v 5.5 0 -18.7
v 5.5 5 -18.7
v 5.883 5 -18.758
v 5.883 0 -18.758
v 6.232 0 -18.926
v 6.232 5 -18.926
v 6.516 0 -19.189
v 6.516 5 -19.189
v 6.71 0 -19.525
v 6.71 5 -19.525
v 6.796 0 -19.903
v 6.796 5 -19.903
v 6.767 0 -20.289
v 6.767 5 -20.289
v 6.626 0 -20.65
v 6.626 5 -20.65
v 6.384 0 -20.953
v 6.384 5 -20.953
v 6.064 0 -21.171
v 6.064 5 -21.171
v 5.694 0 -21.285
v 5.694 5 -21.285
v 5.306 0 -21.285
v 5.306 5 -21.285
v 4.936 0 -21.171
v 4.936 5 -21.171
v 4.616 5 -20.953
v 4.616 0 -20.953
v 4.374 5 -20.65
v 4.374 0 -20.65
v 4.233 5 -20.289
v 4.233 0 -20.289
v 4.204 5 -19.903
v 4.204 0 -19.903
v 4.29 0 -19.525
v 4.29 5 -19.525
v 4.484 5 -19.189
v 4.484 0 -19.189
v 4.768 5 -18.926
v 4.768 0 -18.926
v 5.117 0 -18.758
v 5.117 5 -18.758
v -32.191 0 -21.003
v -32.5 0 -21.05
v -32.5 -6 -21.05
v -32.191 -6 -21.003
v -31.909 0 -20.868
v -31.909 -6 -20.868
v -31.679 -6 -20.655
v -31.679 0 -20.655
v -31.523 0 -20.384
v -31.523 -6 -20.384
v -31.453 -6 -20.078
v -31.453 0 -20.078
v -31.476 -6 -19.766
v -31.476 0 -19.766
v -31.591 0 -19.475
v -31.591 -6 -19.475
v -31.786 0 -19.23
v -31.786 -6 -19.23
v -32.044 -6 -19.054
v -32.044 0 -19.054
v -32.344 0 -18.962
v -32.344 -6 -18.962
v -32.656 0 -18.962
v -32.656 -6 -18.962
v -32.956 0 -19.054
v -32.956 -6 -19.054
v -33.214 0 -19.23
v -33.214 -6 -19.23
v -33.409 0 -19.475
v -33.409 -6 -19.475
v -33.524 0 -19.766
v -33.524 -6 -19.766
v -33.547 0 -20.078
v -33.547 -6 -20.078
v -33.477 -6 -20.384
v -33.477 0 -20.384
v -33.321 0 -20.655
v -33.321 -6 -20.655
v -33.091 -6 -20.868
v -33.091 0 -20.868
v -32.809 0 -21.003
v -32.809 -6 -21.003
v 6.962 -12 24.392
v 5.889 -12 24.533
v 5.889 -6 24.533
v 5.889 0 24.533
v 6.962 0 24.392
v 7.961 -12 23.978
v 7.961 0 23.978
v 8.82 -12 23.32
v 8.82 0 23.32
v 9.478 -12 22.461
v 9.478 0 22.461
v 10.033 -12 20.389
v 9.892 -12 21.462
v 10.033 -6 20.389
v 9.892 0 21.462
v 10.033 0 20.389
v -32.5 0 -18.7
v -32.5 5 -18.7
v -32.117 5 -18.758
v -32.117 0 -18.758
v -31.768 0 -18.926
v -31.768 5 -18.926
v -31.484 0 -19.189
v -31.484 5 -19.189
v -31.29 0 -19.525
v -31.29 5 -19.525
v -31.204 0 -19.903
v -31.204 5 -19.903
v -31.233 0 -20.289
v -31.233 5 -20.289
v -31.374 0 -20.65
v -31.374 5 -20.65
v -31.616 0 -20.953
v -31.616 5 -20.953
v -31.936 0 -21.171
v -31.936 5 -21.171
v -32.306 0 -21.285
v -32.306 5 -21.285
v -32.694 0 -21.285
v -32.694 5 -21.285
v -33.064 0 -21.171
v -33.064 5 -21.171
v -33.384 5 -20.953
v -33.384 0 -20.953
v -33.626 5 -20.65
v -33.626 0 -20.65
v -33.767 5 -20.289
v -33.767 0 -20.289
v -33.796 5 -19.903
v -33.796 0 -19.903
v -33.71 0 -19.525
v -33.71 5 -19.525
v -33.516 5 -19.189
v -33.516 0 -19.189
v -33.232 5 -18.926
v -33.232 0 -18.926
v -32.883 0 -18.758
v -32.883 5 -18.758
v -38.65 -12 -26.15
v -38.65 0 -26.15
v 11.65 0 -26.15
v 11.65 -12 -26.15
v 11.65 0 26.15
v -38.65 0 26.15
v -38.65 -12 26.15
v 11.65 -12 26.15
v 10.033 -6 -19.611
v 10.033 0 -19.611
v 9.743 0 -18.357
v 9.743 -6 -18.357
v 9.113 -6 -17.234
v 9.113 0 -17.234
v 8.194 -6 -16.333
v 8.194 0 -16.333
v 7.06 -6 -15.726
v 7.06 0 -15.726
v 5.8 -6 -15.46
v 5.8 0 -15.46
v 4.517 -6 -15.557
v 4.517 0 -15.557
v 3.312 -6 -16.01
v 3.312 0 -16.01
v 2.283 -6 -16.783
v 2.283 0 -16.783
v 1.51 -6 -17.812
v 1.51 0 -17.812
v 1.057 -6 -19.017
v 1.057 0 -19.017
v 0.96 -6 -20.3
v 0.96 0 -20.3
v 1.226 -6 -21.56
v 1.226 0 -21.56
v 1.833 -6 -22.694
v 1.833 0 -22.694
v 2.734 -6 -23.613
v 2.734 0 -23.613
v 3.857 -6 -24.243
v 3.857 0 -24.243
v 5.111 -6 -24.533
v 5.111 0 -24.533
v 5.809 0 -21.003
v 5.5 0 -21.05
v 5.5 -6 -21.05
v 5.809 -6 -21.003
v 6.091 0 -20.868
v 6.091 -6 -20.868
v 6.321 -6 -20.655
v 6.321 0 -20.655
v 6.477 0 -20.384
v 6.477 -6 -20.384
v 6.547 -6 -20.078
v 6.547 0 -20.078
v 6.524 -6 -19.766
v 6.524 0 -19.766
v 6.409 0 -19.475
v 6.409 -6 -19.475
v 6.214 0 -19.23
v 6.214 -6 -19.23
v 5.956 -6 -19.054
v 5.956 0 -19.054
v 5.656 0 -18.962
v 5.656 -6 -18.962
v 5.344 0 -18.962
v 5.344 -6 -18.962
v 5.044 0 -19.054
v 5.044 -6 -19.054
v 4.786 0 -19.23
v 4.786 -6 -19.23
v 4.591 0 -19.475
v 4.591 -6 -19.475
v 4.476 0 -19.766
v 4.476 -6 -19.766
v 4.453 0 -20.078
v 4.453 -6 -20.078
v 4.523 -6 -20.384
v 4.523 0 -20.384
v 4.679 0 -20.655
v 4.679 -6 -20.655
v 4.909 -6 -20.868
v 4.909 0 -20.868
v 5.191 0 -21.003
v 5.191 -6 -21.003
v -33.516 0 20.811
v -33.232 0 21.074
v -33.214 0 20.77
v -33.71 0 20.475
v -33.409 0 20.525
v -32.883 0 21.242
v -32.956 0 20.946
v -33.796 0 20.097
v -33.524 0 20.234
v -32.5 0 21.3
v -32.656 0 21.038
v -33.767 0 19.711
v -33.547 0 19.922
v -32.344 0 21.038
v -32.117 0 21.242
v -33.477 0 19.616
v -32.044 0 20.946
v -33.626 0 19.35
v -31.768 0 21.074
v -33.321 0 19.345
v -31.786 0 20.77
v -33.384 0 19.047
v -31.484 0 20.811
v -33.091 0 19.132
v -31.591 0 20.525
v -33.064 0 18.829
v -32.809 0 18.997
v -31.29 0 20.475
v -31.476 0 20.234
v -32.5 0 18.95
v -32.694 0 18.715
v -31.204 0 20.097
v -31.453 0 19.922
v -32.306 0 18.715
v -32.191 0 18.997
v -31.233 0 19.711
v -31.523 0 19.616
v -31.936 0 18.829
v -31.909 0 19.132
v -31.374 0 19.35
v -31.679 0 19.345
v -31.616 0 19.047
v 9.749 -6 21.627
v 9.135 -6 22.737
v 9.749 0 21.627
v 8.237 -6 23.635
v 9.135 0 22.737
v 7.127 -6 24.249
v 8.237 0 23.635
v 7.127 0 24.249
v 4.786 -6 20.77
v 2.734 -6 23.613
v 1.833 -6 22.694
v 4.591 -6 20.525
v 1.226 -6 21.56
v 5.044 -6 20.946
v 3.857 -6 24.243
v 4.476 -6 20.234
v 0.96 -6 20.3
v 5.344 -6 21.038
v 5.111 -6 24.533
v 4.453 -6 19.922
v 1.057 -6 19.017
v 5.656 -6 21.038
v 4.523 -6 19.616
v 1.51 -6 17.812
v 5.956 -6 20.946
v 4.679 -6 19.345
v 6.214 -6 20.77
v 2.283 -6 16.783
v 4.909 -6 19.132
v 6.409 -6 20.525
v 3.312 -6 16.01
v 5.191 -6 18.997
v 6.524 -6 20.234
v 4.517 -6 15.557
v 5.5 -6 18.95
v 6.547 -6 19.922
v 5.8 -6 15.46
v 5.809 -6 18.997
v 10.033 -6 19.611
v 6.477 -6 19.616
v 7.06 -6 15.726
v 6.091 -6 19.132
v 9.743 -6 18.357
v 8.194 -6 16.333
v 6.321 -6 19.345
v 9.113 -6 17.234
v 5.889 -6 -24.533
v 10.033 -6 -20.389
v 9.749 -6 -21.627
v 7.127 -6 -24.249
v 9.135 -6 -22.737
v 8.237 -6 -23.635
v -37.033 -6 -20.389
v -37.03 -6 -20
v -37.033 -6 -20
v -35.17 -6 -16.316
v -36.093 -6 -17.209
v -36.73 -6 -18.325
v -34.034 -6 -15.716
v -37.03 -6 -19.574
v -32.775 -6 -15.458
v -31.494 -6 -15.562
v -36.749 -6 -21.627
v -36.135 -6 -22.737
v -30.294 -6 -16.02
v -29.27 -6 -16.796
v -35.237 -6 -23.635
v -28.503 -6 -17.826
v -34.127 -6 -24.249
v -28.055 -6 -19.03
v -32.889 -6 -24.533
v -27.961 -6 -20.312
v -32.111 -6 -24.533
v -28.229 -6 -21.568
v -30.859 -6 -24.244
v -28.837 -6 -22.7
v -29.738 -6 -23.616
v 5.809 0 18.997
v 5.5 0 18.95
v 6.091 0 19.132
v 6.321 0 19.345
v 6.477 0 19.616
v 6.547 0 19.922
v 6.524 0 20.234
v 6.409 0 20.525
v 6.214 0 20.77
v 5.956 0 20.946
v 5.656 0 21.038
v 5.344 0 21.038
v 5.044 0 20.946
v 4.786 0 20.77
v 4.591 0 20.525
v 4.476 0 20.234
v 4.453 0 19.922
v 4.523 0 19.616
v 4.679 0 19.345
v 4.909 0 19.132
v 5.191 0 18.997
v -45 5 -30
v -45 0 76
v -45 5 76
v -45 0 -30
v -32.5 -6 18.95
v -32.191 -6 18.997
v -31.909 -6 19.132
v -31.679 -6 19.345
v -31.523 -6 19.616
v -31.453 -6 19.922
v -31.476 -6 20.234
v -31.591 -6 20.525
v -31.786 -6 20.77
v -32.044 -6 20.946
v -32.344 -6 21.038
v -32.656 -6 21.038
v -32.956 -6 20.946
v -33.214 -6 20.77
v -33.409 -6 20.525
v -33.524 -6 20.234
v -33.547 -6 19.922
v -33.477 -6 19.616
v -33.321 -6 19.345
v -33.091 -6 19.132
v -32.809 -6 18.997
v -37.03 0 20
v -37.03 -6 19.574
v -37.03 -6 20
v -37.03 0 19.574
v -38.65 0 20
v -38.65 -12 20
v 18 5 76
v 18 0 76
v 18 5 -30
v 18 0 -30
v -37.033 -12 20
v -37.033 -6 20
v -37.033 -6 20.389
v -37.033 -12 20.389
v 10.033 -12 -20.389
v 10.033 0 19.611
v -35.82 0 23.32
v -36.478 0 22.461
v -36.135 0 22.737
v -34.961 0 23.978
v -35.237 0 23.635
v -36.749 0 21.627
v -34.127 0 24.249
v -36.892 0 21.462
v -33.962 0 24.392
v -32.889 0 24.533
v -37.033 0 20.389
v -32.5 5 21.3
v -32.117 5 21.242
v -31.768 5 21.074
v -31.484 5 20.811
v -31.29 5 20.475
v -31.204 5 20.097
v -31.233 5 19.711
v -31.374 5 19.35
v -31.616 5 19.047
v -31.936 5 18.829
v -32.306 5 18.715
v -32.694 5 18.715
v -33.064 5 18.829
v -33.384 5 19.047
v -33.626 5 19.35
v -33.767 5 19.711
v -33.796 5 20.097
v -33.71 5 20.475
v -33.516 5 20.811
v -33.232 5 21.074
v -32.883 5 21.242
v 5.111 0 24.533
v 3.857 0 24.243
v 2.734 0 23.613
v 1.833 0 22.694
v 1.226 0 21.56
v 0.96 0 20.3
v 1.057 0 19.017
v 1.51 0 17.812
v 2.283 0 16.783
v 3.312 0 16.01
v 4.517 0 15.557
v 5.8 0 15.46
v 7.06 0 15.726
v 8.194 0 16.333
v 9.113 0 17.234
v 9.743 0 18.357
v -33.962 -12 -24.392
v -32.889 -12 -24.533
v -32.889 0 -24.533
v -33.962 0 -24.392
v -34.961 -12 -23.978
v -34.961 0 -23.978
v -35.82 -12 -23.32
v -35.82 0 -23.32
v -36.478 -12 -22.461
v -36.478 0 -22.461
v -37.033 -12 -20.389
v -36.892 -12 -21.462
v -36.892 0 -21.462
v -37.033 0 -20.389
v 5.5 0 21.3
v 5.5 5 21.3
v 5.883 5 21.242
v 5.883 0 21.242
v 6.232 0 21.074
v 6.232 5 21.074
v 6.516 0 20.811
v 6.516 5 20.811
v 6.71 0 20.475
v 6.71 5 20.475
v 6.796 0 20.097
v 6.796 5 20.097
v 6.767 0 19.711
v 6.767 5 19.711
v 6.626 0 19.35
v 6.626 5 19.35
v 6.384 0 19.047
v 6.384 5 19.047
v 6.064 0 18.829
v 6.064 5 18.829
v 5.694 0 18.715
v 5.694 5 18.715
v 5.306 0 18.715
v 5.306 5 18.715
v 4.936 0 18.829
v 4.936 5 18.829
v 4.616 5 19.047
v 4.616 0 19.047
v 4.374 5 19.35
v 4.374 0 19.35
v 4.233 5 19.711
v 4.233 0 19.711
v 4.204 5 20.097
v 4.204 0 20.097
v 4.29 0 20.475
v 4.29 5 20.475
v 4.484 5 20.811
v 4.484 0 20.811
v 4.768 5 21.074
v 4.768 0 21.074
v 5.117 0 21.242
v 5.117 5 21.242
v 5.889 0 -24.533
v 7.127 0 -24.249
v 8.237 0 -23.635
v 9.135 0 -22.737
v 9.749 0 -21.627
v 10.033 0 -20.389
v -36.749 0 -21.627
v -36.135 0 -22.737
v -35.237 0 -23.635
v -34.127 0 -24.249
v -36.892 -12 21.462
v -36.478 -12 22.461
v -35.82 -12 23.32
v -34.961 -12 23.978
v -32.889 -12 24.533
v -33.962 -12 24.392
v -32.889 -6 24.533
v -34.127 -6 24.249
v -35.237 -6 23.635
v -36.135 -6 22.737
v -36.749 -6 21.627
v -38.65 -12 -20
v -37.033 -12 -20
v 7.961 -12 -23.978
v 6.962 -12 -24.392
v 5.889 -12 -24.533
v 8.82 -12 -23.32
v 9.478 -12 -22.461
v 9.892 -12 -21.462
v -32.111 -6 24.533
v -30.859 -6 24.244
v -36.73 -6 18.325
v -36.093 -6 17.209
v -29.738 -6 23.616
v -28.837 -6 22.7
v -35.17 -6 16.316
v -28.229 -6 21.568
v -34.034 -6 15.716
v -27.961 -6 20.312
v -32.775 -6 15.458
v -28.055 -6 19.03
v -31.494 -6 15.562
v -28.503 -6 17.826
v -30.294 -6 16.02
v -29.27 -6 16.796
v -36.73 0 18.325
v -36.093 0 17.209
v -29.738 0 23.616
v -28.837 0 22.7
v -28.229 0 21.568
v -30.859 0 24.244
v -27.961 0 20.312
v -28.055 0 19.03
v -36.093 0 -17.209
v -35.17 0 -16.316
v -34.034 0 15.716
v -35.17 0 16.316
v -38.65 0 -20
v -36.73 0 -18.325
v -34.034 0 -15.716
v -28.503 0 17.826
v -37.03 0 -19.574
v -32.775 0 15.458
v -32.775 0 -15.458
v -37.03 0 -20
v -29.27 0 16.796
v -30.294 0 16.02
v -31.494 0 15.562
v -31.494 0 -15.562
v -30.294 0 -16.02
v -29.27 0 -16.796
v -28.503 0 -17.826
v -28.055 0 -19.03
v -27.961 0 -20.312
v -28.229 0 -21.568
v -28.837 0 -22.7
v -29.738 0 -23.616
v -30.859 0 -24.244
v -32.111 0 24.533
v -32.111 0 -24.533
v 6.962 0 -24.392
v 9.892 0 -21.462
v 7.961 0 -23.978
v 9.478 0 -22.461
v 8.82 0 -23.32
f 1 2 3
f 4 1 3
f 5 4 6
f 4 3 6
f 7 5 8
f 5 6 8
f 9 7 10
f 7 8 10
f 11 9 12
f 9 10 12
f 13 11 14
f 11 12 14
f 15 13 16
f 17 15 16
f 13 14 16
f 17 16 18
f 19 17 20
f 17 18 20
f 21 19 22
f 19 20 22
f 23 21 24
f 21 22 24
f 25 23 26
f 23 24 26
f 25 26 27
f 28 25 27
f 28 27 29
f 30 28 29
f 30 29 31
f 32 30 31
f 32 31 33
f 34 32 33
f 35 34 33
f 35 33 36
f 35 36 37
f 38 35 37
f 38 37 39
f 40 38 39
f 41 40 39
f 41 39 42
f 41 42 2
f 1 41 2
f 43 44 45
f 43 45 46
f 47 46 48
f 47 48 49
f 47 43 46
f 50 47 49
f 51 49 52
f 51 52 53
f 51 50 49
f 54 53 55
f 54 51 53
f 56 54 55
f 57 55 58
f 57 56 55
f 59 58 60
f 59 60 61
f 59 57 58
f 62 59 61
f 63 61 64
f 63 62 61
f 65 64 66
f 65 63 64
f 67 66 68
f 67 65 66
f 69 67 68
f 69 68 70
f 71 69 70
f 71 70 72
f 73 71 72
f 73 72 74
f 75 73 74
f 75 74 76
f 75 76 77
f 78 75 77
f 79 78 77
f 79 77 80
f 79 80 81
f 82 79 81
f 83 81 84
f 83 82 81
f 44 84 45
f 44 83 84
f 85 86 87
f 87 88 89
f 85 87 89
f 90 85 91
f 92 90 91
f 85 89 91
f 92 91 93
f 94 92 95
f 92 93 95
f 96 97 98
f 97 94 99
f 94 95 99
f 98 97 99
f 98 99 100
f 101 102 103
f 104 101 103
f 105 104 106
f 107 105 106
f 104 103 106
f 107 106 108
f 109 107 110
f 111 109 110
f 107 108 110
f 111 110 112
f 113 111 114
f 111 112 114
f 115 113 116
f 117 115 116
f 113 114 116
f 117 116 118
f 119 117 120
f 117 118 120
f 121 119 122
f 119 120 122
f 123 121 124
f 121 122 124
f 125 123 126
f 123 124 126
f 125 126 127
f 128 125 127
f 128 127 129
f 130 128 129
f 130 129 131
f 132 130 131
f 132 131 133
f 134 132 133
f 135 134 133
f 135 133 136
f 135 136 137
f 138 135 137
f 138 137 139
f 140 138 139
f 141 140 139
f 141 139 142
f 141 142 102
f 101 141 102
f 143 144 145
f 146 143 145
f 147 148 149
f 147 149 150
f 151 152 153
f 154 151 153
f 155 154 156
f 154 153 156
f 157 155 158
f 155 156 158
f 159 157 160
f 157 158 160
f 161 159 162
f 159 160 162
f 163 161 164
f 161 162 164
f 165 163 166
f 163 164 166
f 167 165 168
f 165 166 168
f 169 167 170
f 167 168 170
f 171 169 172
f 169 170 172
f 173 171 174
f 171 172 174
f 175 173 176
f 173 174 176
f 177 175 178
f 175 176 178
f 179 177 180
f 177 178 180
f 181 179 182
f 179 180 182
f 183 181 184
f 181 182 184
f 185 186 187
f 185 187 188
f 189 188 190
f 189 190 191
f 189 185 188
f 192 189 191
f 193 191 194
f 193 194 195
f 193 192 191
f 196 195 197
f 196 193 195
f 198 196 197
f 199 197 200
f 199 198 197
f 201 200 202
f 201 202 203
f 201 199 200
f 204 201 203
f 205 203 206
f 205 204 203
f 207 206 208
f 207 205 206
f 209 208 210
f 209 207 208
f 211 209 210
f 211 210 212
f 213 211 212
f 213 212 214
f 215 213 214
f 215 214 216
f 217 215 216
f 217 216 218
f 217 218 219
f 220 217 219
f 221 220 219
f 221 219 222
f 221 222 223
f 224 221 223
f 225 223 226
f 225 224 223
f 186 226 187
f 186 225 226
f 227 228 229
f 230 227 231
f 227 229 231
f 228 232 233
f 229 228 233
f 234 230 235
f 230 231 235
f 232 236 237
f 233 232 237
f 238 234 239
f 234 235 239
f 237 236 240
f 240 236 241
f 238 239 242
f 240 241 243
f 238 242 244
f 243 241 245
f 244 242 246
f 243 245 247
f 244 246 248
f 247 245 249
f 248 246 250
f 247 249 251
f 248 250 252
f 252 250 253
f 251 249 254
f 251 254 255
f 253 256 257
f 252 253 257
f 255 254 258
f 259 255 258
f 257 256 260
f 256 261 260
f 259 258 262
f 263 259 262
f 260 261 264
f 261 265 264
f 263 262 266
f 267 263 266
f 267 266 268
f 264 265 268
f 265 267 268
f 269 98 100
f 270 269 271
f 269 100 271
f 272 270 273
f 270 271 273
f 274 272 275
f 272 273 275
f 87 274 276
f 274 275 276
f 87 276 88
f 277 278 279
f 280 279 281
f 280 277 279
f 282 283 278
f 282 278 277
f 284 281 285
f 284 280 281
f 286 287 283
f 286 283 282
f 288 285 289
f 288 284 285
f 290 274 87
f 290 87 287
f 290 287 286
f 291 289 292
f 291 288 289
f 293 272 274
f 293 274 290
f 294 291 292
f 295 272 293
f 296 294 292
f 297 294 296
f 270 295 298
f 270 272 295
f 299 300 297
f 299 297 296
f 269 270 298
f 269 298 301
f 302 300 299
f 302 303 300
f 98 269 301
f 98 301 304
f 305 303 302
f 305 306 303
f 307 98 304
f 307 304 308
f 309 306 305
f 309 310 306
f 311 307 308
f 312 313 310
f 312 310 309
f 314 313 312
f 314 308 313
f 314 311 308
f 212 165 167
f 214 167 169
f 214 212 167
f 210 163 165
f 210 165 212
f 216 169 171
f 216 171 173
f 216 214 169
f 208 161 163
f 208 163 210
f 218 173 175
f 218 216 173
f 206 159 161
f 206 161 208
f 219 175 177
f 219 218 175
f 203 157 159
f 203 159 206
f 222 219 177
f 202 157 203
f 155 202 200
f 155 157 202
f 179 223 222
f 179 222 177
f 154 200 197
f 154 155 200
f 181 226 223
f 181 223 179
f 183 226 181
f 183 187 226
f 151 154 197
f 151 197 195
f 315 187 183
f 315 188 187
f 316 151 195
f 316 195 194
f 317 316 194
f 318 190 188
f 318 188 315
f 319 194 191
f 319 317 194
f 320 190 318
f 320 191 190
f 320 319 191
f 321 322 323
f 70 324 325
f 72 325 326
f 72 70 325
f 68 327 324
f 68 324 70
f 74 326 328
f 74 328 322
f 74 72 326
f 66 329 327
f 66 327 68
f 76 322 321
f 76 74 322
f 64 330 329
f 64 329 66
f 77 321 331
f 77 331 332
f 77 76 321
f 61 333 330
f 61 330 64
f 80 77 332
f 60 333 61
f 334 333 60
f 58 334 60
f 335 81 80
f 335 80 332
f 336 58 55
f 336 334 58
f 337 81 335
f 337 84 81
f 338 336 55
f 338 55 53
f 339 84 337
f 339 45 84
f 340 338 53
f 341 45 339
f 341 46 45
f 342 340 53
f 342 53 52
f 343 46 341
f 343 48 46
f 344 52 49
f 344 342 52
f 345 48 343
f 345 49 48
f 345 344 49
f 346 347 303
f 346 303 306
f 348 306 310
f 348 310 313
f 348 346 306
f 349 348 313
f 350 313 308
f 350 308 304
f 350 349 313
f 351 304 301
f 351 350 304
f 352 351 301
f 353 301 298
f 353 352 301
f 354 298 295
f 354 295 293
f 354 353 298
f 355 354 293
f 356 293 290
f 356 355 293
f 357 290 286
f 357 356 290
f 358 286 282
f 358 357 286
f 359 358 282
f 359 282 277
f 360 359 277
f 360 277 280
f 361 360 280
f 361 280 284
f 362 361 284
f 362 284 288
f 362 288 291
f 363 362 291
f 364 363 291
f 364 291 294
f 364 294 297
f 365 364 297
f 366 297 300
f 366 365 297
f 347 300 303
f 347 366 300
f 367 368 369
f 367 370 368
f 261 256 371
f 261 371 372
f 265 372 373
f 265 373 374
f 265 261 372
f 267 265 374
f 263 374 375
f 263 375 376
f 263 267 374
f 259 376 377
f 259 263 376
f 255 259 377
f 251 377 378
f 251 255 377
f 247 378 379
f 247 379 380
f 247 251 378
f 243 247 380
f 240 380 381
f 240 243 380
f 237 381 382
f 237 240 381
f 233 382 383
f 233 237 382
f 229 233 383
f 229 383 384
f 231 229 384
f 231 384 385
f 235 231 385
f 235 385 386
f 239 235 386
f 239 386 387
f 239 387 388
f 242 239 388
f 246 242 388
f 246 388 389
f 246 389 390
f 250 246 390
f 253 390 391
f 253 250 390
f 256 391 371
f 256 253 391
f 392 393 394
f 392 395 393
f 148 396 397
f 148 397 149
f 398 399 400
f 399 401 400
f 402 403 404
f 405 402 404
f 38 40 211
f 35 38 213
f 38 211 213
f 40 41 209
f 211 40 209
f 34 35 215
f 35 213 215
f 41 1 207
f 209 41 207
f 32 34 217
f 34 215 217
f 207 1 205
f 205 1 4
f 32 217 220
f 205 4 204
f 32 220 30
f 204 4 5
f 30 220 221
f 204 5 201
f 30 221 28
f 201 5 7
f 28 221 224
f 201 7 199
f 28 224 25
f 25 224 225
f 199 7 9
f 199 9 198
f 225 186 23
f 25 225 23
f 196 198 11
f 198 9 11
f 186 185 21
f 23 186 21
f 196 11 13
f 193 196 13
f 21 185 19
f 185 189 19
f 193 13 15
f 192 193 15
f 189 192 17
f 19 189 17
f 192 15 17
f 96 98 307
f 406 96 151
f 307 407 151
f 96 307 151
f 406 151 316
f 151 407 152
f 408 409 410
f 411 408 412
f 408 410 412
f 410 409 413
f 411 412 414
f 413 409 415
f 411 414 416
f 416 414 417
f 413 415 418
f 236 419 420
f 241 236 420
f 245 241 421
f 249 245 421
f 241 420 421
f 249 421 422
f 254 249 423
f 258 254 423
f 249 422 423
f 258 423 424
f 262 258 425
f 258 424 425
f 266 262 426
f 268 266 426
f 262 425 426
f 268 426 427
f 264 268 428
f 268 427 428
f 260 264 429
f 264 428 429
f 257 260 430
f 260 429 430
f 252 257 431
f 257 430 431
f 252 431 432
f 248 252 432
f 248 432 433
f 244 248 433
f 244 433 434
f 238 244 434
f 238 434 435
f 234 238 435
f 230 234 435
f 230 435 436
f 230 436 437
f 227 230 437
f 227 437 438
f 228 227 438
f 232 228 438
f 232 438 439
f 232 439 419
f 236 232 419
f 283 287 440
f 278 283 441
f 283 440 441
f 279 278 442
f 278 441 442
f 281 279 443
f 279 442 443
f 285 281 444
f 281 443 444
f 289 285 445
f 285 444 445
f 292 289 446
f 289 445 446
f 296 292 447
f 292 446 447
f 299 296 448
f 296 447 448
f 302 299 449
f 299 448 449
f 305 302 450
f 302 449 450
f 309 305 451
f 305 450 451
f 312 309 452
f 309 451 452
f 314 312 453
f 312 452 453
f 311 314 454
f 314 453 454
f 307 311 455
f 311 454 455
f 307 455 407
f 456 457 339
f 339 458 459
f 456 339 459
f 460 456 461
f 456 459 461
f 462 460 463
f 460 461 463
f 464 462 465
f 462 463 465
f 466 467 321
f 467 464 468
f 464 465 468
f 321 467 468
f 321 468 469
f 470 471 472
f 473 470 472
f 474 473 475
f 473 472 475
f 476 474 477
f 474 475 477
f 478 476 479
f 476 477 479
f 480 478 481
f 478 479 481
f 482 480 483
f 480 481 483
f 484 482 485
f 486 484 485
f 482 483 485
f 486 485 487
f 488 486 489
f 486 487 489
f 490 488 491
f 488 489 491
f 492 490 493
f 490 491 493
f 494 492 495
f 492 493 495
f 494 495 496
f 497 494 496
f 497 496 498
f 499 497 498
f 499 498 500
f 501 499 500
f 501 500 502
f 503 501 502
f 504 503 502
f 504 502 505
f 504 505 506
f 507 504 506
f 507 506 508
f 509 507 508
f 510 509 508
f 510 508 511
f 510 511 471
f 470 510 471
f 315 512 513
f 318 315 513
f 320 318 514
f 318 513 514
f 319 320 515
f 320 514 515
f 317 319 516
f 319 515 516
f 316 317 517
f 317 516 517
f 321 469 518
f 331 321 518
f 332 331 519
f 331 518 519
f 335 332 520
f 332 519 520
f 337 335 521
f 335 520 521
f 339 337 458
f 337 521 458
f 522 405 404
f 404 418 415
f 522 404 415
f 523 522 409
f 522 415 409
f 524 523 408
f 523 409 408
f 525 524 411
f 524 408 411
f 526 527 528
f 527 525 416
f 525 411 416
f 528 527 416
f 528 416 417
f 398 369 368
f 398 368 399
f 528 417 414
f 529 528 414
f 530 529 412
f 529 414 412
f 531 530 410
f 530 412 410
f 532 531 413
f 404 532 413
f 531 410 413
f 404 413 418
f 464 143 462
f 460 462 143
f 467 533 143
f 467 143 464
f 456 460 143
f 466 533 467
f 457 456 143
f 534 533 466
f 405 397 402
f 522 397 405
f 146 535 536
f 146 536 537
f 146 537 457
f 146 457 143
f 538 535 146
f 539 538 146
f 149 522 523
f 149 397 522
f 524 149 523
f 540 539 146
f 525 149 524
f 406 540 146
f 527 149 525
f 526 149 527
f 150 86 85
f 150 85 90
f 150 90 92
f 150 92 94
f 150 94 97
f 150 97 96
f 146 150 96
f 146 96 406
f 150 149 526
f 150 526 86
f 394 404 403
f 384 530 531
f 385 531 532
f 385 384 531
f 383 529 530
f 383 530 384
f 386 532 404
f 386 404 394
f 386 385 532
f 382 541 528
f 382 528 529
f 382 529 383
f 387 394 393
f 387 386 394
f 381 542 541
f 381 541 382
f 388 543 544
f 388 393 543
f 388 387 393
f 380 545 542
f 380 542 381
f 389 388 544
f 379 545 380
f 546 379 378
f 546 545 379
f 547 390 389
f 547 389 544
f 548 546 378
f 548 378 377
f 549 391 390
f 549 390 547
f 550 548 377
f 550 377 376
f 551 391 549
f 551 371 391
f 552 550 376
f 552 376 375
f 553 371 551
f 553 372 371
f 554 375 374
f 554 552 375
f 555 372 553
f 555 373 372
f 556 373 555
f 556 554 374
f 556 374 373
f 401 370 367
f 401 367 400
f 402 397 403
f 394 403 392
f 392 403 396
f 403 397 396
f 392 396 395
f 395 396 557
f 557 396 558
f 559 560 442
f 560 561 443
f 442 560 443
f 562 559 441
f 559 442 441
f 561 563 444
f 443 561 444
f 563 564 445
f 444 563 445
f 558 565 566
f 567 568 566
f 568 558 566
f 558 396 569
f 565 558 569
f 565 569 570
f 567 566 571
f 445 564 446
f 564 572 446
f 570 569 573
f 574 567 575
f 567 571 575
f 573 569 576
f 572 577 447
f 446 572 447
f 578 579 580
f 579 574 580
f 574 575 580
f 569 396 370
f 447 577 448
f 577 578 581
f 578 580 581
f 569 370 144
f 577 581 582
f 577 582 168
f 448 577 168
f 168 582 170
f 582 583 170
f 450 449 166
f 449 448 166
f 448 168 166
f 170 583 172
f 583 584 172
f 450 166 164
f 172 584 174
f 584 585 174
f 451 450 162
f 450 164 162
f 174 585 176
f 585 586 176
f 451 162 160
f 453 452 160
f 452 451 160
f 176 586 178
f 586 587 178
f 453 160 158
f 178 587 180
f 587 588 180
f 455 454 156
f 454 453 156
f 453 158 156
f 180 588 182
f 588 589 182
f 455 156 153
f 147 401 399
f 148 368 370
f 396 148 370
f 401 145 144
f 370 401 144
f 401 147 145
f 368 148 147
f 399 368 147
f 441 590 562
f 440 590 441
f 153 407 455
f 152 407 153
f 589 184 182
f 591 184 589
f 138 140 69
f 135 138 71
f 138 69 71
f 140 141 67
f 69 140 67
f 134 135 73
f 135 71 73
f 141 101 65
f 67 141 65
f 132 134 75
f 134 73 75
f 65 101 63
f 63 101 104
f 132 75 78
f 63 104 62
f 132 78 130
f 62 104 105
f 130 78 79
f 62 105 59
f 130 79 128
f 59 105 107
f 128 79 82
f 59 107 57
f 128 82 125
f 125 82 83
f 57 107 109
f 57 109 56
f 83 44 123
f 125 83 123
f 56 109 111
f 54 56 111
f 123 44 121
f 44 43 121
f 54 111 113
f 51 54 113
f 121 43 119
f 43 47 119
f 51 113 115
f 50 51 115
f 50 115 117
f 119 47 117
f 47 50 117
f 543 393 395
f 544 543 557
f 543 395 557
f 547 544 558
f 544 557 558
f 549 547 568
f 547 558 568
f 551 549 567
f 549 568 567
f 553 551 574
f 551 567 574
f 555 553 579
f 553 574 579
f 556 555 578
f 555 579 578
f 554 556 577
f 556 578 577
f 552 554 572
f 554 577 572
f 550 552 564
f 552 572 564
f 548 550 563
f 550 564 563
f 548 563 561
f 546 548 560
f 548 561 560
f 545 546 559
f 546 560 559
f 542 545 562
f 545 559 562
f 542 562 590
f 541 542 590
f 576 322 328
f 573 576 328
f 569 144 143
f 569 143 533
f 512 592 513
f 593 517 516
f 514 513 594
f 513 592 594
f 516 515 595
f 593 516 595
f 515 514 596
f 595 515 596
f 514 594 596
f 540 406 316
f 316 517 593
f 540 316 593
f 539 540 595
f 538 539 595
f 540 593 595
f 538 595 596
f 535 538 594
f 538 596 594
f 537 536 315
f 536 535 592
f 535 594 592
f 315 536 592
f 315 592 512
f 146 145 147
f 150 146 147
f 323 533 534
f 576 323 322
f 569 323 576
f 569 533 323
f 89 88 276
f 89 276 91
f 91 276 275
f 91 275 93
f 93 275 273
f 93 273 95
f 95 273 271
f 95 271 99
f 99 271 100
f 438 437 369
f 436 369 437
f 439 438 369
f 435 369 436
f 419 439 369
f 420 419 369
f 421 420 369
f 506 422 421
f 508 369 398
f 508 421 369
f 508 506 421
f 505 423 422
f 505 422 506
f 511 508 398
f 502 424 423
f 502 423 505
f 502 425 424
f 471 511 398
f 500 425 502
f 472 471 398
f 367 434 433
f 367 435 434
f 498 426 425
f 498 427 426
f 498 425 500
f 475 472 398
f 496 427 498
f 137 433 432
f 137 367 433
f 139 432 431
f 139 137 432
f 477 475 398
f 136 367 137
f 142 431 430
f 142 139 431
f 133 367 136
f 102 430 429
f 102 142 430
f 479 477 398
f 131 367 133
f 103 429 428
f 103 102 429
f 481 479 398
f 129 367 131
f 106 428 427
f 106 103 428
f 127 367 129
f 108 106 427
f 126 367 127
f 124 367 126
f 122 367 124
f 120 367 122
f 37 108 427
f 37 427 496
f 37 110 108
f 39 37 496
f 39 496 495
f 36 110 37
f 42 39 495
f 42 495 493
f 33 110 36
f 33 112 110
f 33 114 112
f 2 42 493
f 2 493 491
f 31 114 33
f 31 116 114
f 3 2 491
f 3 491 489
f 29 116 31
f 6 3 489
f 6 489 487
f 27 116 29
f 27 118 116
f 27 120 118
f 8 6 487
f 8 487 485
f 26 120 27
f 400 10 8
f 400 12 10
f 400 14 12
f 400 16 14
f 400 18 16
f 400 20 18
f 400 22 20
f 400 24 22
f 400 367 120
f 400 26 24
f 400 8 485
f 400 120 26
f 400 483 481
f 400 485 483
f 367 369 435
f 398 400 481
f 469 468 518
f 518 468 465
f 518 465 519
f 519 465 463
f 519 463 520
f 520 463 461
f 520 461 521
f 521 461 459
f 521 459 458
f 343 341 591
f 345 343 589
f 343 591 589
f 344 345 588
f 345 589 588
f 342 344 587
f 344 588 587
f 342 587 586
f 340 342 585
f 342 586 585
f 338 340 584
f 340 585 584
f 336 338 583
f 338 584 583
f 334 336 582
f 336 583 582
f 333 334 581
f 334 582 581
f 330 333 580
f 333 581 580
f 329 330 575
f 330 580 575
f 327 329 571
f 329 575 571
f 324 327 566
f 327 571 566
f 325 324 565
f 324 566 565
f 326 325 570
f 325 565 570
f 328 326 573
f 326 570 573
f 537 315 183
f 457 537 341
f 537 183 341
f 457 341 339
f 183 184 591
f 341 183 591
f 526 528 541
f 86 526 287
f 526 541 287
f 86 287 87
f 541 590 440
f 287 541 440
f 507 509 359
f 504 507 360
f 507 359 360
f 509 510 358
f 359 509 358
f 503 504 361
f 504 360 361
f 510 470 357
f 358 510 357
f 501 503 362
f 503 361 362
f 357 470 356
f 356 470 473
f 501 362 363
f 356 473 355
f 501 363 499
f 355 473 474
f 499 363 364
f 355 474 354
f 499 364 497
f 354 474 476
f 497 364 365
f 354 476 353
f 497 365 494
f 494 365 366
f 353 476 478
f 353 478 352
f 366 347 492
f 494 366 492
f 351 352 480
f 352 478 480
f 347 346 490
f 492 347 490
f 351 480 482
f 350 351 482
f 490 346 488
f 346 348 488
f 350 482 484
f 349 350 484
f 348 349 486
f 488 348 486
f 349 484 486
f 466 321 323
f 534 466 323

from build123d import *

# Parameters (mm, degrees)
SKETCH3_W           = 63
SKETCH3_H           = 60
BOSS_EXTRUDE3_DEPTH = 5
CUT_EXTRUDE1_REACH  = 56.314
SKETCH4_R           = 1.3
SKETCH9_R           = 4.55
SKETCH9_R_2         = 1.05
BOSS_EXTRUDE5_DEPTH = 6
SKETCH11_W          = 63
SKETCH11_H          = 5
BOSS_EXTRUDE7_DEPTH = 46
SKETCH12_W          = 50.3
SKETCH12_H          = 52.3
BOSS_EXTRUDE8_DEPTH = 12
SKETCH13_W          = 40
SKETCH13_H          = 12
CUT_EXTRUDE4_DEPTH  = 1.62


with BuildPart() as part:
    # Sketch3 → Boss-Extrude3 (new body)
    with BuildSketch(Plane(origin=(0, 0, 0), x_dir=(1, 0, 0), z_dir=(0, 1, 0))):
        with Locations((-13.5, 0)):
            Rectangle(SKETCH3_W, SKETCH3_H)
    extrude(amount=BOSS_EXTRUDE3_DEPTH)

    # Sketch4 → Cut-Extrude1 (cut, up to next)
    with BuildSketch(Plane(origin=(0, 5, 0), x_dir=(1, 0, 0), z_dir=(0, 1, 0)), mode=Mode.PRIVATE) as cut_extrude1_sk1:
        with Locations(Location((-32.5, 20, 0), (0, 0, 270))):
            Circle(SKETCH4_R)
    cut_extrude1_tool1 = extrude(cut_extrude1_sk1.sketch, amount=-CUT_EXTRUDE1_REACH, mode=Mode.PRIVATE) & part.part
    # Sketch4 → Cut-Extrude1 (cut, up to next)
    with BuildSketch(Plane(origin=(0, 5, 0), x_dir=(1, 0, 0), z_dir=(0, 1, 0)), mode=Mode.PRIVATE) as cut_extrude1_sk2:
        with Locations(Location((5.5, 20, 0), (0, 0, 270))):
            Circle(SKETCH4_R)
    cut_extrude1_tool2 = extrude(cut_extrude1_sk2.sketch, amount=-CUT_EXTRUDE1_REACH, mode=Mode.PRIVATE) & part.part
    # Sketch4 → Cut-Extrude1 (cut, up to next)
    with BuildSketch(Plane(origin=(0, 5, 0), x_dir=(1, 0, 0), z_dir=(0, 1, 0)), mode=Mode.PRIVATE) as cut_extrude1_sk3:
        with Locations(Location((5.5, -20, 0), (0, 0, 270))):
            Circle(SKETCH4_R)
    cut_extrude1_tool3 = extrude(cut_extrude1_sk3.sketch, amount=-CUT_EXTRUDE1_REACH, mode=Mode.PRIVATE) & part.part
    # Sketch4 → Cut-Extrude1 (cut, up to next)
    with BuildSketch(Plane(origin=(0, 5, 0), x_dir=(1, 0, 0), z_dir=(0, 1, 0)), mode=Mode.PRIVATE) as cut_extrude1_sk4:
        with Locations(Location((-32.5, -20, 0), (0, 0, 270))):
            Circle(SKETCH4_R)
    cut_extrude1_tool4 = extrude(cut_extrude1_sk4.sketch, amount=-CUT_EXTRUDE1_REACH, mode=Mode.PRIVATE) & part.part
    add(cut_extrude1_tool1.solids().sort_by_distance((-32.5, 5, -20))[0], mode=Mode.SUBTRACT)
    add(cut_extrude1_tool2.solids().sort_by_distance((5.5, 5, -20))[0], mode=Mode.SUBTRACT)
    add(cut_extrude1_tool3.solids().sort_by_distance((5.5, 5, 20))[0], mode=Mode.SUBTRACT)
    add(cut_extrude1_tool4.solids().sort_by_distance((-32.5, 5, 20))[0], mode=Mode.SUBTRACT)

    # Sketch9 → Boss-Extrude5 (add)
    # profile 1 of 4: a face of its own
    with BuildSketch(Plane.XZ):
        with Locations(Location((-32.5, 20, 0), (0, 0, 270))):
            Circle(SKETCH9_R)
        with Locations(Location((-32.5, 20, 0), (0, 0, 270))):
            Circle(SKETCH9_R_2, mode=Mode.SUBTRACT)
    # profile 2 of 4: a face of its own
    with BuildSketch(Plane.XZ):
        with Locations(Location((-32.5, -20, 0), (0, 0, 270))):
            Circle(SKETCH9_R)
        with Locations(Location((-32.5, -20, 0), (0, 0, 270))):
            Circle(SKETCH9_R_2, mode=Mode.SUBTRACT)
    # profile 3 of 4: a face of its own
    with BuildSketch(Plane.XZ):
        with Locations(Location((5.5, 20, 0), (0, 0, 270))):
            Circle(SKETCH9_R)
        with Locations(Location((5.5, 20, 0), (0, 0, 270))):
            Circle(SKETCH9_R_2, mode=Mode.SUBTRACT)
    # profile 4 of 4: a face of its own
    with BuildSketch(Plane.XZ):
        with Locations(Location((5.5, -20, 0), (0, 0, 270))):
            Circle(SKETCH9_R)
        with Locations(Location((5.5, -20, 0), (0, 0, 270))):
            Circle(SKETCH9_R_2, mode=Mode.SUBTRACT)
    extrude(amount=BOSS_EXTRUDE5_DEPTH)

    # Sketch11 → Boss-Extrude7 (add)
    with BuildSketch(Plane.XY.offset(30)):
        with Locations((-13.5, 2.5)):
            Rectangle(SKETCH11_W, SKETCH11_H)
    extrude(amount=BOSS_EXTRUDE7_DEPTH)

    # Sketch12 → Boss-Extrude8 (add)
    with BuildSketch(Plane.XZ):
        with Locations((-13.5, 0)):
            Rectangle(SKETCH12_W, SKETCH12_H)
        with BuildLine():
            Line((-32.889447937, 24.533302362), (5.889447937, 24.533302362))
            ThreePointArc((5.889447937, 24.533302362), (8.819595501, 23.319595501), (10.033302362, 20.389447937))
            Line((10.033302362, 20.389447937), (10.033302362, -20.389447937))
            ThreePointArc((10.033302362, -20.389447937), (8.819595501, -23.319595501), (5.889447937, -24.533302362))
            Line((5.889447937, -24.533302362), (-32.889447937, -24.533302362))
            ThreePointArc((-32.889447937, -24.533302362), (-35.819595501, -23.319595501), (-37.033302362, -20.389447937))
            Line((-37.033302362, -20.389447937), (-37.033302362, 20.389447937))
            ThreePointArc((-37.033302362, 20.389447937), (-35.819595501, 23.319595501), (-32.889447937, 24.533302362))
        make_face(mode=Mode.SUBTRACT)
    extrude(amount=BOSS_EXTRUDE8_DEPTH)

    # Sketch13 → Cut-Extrude4 (cut)
    with BuildSketch(Plane.ZY.offset(38.65)):
        with Locations((0, -6)):
            Rectangle(SKETCH13_W, SKETCH13_H)
    extrude(amount=-CUT_EXTRUDE4_DEPTH, mode=Mode.SUBTRACT)


solid = part.part
